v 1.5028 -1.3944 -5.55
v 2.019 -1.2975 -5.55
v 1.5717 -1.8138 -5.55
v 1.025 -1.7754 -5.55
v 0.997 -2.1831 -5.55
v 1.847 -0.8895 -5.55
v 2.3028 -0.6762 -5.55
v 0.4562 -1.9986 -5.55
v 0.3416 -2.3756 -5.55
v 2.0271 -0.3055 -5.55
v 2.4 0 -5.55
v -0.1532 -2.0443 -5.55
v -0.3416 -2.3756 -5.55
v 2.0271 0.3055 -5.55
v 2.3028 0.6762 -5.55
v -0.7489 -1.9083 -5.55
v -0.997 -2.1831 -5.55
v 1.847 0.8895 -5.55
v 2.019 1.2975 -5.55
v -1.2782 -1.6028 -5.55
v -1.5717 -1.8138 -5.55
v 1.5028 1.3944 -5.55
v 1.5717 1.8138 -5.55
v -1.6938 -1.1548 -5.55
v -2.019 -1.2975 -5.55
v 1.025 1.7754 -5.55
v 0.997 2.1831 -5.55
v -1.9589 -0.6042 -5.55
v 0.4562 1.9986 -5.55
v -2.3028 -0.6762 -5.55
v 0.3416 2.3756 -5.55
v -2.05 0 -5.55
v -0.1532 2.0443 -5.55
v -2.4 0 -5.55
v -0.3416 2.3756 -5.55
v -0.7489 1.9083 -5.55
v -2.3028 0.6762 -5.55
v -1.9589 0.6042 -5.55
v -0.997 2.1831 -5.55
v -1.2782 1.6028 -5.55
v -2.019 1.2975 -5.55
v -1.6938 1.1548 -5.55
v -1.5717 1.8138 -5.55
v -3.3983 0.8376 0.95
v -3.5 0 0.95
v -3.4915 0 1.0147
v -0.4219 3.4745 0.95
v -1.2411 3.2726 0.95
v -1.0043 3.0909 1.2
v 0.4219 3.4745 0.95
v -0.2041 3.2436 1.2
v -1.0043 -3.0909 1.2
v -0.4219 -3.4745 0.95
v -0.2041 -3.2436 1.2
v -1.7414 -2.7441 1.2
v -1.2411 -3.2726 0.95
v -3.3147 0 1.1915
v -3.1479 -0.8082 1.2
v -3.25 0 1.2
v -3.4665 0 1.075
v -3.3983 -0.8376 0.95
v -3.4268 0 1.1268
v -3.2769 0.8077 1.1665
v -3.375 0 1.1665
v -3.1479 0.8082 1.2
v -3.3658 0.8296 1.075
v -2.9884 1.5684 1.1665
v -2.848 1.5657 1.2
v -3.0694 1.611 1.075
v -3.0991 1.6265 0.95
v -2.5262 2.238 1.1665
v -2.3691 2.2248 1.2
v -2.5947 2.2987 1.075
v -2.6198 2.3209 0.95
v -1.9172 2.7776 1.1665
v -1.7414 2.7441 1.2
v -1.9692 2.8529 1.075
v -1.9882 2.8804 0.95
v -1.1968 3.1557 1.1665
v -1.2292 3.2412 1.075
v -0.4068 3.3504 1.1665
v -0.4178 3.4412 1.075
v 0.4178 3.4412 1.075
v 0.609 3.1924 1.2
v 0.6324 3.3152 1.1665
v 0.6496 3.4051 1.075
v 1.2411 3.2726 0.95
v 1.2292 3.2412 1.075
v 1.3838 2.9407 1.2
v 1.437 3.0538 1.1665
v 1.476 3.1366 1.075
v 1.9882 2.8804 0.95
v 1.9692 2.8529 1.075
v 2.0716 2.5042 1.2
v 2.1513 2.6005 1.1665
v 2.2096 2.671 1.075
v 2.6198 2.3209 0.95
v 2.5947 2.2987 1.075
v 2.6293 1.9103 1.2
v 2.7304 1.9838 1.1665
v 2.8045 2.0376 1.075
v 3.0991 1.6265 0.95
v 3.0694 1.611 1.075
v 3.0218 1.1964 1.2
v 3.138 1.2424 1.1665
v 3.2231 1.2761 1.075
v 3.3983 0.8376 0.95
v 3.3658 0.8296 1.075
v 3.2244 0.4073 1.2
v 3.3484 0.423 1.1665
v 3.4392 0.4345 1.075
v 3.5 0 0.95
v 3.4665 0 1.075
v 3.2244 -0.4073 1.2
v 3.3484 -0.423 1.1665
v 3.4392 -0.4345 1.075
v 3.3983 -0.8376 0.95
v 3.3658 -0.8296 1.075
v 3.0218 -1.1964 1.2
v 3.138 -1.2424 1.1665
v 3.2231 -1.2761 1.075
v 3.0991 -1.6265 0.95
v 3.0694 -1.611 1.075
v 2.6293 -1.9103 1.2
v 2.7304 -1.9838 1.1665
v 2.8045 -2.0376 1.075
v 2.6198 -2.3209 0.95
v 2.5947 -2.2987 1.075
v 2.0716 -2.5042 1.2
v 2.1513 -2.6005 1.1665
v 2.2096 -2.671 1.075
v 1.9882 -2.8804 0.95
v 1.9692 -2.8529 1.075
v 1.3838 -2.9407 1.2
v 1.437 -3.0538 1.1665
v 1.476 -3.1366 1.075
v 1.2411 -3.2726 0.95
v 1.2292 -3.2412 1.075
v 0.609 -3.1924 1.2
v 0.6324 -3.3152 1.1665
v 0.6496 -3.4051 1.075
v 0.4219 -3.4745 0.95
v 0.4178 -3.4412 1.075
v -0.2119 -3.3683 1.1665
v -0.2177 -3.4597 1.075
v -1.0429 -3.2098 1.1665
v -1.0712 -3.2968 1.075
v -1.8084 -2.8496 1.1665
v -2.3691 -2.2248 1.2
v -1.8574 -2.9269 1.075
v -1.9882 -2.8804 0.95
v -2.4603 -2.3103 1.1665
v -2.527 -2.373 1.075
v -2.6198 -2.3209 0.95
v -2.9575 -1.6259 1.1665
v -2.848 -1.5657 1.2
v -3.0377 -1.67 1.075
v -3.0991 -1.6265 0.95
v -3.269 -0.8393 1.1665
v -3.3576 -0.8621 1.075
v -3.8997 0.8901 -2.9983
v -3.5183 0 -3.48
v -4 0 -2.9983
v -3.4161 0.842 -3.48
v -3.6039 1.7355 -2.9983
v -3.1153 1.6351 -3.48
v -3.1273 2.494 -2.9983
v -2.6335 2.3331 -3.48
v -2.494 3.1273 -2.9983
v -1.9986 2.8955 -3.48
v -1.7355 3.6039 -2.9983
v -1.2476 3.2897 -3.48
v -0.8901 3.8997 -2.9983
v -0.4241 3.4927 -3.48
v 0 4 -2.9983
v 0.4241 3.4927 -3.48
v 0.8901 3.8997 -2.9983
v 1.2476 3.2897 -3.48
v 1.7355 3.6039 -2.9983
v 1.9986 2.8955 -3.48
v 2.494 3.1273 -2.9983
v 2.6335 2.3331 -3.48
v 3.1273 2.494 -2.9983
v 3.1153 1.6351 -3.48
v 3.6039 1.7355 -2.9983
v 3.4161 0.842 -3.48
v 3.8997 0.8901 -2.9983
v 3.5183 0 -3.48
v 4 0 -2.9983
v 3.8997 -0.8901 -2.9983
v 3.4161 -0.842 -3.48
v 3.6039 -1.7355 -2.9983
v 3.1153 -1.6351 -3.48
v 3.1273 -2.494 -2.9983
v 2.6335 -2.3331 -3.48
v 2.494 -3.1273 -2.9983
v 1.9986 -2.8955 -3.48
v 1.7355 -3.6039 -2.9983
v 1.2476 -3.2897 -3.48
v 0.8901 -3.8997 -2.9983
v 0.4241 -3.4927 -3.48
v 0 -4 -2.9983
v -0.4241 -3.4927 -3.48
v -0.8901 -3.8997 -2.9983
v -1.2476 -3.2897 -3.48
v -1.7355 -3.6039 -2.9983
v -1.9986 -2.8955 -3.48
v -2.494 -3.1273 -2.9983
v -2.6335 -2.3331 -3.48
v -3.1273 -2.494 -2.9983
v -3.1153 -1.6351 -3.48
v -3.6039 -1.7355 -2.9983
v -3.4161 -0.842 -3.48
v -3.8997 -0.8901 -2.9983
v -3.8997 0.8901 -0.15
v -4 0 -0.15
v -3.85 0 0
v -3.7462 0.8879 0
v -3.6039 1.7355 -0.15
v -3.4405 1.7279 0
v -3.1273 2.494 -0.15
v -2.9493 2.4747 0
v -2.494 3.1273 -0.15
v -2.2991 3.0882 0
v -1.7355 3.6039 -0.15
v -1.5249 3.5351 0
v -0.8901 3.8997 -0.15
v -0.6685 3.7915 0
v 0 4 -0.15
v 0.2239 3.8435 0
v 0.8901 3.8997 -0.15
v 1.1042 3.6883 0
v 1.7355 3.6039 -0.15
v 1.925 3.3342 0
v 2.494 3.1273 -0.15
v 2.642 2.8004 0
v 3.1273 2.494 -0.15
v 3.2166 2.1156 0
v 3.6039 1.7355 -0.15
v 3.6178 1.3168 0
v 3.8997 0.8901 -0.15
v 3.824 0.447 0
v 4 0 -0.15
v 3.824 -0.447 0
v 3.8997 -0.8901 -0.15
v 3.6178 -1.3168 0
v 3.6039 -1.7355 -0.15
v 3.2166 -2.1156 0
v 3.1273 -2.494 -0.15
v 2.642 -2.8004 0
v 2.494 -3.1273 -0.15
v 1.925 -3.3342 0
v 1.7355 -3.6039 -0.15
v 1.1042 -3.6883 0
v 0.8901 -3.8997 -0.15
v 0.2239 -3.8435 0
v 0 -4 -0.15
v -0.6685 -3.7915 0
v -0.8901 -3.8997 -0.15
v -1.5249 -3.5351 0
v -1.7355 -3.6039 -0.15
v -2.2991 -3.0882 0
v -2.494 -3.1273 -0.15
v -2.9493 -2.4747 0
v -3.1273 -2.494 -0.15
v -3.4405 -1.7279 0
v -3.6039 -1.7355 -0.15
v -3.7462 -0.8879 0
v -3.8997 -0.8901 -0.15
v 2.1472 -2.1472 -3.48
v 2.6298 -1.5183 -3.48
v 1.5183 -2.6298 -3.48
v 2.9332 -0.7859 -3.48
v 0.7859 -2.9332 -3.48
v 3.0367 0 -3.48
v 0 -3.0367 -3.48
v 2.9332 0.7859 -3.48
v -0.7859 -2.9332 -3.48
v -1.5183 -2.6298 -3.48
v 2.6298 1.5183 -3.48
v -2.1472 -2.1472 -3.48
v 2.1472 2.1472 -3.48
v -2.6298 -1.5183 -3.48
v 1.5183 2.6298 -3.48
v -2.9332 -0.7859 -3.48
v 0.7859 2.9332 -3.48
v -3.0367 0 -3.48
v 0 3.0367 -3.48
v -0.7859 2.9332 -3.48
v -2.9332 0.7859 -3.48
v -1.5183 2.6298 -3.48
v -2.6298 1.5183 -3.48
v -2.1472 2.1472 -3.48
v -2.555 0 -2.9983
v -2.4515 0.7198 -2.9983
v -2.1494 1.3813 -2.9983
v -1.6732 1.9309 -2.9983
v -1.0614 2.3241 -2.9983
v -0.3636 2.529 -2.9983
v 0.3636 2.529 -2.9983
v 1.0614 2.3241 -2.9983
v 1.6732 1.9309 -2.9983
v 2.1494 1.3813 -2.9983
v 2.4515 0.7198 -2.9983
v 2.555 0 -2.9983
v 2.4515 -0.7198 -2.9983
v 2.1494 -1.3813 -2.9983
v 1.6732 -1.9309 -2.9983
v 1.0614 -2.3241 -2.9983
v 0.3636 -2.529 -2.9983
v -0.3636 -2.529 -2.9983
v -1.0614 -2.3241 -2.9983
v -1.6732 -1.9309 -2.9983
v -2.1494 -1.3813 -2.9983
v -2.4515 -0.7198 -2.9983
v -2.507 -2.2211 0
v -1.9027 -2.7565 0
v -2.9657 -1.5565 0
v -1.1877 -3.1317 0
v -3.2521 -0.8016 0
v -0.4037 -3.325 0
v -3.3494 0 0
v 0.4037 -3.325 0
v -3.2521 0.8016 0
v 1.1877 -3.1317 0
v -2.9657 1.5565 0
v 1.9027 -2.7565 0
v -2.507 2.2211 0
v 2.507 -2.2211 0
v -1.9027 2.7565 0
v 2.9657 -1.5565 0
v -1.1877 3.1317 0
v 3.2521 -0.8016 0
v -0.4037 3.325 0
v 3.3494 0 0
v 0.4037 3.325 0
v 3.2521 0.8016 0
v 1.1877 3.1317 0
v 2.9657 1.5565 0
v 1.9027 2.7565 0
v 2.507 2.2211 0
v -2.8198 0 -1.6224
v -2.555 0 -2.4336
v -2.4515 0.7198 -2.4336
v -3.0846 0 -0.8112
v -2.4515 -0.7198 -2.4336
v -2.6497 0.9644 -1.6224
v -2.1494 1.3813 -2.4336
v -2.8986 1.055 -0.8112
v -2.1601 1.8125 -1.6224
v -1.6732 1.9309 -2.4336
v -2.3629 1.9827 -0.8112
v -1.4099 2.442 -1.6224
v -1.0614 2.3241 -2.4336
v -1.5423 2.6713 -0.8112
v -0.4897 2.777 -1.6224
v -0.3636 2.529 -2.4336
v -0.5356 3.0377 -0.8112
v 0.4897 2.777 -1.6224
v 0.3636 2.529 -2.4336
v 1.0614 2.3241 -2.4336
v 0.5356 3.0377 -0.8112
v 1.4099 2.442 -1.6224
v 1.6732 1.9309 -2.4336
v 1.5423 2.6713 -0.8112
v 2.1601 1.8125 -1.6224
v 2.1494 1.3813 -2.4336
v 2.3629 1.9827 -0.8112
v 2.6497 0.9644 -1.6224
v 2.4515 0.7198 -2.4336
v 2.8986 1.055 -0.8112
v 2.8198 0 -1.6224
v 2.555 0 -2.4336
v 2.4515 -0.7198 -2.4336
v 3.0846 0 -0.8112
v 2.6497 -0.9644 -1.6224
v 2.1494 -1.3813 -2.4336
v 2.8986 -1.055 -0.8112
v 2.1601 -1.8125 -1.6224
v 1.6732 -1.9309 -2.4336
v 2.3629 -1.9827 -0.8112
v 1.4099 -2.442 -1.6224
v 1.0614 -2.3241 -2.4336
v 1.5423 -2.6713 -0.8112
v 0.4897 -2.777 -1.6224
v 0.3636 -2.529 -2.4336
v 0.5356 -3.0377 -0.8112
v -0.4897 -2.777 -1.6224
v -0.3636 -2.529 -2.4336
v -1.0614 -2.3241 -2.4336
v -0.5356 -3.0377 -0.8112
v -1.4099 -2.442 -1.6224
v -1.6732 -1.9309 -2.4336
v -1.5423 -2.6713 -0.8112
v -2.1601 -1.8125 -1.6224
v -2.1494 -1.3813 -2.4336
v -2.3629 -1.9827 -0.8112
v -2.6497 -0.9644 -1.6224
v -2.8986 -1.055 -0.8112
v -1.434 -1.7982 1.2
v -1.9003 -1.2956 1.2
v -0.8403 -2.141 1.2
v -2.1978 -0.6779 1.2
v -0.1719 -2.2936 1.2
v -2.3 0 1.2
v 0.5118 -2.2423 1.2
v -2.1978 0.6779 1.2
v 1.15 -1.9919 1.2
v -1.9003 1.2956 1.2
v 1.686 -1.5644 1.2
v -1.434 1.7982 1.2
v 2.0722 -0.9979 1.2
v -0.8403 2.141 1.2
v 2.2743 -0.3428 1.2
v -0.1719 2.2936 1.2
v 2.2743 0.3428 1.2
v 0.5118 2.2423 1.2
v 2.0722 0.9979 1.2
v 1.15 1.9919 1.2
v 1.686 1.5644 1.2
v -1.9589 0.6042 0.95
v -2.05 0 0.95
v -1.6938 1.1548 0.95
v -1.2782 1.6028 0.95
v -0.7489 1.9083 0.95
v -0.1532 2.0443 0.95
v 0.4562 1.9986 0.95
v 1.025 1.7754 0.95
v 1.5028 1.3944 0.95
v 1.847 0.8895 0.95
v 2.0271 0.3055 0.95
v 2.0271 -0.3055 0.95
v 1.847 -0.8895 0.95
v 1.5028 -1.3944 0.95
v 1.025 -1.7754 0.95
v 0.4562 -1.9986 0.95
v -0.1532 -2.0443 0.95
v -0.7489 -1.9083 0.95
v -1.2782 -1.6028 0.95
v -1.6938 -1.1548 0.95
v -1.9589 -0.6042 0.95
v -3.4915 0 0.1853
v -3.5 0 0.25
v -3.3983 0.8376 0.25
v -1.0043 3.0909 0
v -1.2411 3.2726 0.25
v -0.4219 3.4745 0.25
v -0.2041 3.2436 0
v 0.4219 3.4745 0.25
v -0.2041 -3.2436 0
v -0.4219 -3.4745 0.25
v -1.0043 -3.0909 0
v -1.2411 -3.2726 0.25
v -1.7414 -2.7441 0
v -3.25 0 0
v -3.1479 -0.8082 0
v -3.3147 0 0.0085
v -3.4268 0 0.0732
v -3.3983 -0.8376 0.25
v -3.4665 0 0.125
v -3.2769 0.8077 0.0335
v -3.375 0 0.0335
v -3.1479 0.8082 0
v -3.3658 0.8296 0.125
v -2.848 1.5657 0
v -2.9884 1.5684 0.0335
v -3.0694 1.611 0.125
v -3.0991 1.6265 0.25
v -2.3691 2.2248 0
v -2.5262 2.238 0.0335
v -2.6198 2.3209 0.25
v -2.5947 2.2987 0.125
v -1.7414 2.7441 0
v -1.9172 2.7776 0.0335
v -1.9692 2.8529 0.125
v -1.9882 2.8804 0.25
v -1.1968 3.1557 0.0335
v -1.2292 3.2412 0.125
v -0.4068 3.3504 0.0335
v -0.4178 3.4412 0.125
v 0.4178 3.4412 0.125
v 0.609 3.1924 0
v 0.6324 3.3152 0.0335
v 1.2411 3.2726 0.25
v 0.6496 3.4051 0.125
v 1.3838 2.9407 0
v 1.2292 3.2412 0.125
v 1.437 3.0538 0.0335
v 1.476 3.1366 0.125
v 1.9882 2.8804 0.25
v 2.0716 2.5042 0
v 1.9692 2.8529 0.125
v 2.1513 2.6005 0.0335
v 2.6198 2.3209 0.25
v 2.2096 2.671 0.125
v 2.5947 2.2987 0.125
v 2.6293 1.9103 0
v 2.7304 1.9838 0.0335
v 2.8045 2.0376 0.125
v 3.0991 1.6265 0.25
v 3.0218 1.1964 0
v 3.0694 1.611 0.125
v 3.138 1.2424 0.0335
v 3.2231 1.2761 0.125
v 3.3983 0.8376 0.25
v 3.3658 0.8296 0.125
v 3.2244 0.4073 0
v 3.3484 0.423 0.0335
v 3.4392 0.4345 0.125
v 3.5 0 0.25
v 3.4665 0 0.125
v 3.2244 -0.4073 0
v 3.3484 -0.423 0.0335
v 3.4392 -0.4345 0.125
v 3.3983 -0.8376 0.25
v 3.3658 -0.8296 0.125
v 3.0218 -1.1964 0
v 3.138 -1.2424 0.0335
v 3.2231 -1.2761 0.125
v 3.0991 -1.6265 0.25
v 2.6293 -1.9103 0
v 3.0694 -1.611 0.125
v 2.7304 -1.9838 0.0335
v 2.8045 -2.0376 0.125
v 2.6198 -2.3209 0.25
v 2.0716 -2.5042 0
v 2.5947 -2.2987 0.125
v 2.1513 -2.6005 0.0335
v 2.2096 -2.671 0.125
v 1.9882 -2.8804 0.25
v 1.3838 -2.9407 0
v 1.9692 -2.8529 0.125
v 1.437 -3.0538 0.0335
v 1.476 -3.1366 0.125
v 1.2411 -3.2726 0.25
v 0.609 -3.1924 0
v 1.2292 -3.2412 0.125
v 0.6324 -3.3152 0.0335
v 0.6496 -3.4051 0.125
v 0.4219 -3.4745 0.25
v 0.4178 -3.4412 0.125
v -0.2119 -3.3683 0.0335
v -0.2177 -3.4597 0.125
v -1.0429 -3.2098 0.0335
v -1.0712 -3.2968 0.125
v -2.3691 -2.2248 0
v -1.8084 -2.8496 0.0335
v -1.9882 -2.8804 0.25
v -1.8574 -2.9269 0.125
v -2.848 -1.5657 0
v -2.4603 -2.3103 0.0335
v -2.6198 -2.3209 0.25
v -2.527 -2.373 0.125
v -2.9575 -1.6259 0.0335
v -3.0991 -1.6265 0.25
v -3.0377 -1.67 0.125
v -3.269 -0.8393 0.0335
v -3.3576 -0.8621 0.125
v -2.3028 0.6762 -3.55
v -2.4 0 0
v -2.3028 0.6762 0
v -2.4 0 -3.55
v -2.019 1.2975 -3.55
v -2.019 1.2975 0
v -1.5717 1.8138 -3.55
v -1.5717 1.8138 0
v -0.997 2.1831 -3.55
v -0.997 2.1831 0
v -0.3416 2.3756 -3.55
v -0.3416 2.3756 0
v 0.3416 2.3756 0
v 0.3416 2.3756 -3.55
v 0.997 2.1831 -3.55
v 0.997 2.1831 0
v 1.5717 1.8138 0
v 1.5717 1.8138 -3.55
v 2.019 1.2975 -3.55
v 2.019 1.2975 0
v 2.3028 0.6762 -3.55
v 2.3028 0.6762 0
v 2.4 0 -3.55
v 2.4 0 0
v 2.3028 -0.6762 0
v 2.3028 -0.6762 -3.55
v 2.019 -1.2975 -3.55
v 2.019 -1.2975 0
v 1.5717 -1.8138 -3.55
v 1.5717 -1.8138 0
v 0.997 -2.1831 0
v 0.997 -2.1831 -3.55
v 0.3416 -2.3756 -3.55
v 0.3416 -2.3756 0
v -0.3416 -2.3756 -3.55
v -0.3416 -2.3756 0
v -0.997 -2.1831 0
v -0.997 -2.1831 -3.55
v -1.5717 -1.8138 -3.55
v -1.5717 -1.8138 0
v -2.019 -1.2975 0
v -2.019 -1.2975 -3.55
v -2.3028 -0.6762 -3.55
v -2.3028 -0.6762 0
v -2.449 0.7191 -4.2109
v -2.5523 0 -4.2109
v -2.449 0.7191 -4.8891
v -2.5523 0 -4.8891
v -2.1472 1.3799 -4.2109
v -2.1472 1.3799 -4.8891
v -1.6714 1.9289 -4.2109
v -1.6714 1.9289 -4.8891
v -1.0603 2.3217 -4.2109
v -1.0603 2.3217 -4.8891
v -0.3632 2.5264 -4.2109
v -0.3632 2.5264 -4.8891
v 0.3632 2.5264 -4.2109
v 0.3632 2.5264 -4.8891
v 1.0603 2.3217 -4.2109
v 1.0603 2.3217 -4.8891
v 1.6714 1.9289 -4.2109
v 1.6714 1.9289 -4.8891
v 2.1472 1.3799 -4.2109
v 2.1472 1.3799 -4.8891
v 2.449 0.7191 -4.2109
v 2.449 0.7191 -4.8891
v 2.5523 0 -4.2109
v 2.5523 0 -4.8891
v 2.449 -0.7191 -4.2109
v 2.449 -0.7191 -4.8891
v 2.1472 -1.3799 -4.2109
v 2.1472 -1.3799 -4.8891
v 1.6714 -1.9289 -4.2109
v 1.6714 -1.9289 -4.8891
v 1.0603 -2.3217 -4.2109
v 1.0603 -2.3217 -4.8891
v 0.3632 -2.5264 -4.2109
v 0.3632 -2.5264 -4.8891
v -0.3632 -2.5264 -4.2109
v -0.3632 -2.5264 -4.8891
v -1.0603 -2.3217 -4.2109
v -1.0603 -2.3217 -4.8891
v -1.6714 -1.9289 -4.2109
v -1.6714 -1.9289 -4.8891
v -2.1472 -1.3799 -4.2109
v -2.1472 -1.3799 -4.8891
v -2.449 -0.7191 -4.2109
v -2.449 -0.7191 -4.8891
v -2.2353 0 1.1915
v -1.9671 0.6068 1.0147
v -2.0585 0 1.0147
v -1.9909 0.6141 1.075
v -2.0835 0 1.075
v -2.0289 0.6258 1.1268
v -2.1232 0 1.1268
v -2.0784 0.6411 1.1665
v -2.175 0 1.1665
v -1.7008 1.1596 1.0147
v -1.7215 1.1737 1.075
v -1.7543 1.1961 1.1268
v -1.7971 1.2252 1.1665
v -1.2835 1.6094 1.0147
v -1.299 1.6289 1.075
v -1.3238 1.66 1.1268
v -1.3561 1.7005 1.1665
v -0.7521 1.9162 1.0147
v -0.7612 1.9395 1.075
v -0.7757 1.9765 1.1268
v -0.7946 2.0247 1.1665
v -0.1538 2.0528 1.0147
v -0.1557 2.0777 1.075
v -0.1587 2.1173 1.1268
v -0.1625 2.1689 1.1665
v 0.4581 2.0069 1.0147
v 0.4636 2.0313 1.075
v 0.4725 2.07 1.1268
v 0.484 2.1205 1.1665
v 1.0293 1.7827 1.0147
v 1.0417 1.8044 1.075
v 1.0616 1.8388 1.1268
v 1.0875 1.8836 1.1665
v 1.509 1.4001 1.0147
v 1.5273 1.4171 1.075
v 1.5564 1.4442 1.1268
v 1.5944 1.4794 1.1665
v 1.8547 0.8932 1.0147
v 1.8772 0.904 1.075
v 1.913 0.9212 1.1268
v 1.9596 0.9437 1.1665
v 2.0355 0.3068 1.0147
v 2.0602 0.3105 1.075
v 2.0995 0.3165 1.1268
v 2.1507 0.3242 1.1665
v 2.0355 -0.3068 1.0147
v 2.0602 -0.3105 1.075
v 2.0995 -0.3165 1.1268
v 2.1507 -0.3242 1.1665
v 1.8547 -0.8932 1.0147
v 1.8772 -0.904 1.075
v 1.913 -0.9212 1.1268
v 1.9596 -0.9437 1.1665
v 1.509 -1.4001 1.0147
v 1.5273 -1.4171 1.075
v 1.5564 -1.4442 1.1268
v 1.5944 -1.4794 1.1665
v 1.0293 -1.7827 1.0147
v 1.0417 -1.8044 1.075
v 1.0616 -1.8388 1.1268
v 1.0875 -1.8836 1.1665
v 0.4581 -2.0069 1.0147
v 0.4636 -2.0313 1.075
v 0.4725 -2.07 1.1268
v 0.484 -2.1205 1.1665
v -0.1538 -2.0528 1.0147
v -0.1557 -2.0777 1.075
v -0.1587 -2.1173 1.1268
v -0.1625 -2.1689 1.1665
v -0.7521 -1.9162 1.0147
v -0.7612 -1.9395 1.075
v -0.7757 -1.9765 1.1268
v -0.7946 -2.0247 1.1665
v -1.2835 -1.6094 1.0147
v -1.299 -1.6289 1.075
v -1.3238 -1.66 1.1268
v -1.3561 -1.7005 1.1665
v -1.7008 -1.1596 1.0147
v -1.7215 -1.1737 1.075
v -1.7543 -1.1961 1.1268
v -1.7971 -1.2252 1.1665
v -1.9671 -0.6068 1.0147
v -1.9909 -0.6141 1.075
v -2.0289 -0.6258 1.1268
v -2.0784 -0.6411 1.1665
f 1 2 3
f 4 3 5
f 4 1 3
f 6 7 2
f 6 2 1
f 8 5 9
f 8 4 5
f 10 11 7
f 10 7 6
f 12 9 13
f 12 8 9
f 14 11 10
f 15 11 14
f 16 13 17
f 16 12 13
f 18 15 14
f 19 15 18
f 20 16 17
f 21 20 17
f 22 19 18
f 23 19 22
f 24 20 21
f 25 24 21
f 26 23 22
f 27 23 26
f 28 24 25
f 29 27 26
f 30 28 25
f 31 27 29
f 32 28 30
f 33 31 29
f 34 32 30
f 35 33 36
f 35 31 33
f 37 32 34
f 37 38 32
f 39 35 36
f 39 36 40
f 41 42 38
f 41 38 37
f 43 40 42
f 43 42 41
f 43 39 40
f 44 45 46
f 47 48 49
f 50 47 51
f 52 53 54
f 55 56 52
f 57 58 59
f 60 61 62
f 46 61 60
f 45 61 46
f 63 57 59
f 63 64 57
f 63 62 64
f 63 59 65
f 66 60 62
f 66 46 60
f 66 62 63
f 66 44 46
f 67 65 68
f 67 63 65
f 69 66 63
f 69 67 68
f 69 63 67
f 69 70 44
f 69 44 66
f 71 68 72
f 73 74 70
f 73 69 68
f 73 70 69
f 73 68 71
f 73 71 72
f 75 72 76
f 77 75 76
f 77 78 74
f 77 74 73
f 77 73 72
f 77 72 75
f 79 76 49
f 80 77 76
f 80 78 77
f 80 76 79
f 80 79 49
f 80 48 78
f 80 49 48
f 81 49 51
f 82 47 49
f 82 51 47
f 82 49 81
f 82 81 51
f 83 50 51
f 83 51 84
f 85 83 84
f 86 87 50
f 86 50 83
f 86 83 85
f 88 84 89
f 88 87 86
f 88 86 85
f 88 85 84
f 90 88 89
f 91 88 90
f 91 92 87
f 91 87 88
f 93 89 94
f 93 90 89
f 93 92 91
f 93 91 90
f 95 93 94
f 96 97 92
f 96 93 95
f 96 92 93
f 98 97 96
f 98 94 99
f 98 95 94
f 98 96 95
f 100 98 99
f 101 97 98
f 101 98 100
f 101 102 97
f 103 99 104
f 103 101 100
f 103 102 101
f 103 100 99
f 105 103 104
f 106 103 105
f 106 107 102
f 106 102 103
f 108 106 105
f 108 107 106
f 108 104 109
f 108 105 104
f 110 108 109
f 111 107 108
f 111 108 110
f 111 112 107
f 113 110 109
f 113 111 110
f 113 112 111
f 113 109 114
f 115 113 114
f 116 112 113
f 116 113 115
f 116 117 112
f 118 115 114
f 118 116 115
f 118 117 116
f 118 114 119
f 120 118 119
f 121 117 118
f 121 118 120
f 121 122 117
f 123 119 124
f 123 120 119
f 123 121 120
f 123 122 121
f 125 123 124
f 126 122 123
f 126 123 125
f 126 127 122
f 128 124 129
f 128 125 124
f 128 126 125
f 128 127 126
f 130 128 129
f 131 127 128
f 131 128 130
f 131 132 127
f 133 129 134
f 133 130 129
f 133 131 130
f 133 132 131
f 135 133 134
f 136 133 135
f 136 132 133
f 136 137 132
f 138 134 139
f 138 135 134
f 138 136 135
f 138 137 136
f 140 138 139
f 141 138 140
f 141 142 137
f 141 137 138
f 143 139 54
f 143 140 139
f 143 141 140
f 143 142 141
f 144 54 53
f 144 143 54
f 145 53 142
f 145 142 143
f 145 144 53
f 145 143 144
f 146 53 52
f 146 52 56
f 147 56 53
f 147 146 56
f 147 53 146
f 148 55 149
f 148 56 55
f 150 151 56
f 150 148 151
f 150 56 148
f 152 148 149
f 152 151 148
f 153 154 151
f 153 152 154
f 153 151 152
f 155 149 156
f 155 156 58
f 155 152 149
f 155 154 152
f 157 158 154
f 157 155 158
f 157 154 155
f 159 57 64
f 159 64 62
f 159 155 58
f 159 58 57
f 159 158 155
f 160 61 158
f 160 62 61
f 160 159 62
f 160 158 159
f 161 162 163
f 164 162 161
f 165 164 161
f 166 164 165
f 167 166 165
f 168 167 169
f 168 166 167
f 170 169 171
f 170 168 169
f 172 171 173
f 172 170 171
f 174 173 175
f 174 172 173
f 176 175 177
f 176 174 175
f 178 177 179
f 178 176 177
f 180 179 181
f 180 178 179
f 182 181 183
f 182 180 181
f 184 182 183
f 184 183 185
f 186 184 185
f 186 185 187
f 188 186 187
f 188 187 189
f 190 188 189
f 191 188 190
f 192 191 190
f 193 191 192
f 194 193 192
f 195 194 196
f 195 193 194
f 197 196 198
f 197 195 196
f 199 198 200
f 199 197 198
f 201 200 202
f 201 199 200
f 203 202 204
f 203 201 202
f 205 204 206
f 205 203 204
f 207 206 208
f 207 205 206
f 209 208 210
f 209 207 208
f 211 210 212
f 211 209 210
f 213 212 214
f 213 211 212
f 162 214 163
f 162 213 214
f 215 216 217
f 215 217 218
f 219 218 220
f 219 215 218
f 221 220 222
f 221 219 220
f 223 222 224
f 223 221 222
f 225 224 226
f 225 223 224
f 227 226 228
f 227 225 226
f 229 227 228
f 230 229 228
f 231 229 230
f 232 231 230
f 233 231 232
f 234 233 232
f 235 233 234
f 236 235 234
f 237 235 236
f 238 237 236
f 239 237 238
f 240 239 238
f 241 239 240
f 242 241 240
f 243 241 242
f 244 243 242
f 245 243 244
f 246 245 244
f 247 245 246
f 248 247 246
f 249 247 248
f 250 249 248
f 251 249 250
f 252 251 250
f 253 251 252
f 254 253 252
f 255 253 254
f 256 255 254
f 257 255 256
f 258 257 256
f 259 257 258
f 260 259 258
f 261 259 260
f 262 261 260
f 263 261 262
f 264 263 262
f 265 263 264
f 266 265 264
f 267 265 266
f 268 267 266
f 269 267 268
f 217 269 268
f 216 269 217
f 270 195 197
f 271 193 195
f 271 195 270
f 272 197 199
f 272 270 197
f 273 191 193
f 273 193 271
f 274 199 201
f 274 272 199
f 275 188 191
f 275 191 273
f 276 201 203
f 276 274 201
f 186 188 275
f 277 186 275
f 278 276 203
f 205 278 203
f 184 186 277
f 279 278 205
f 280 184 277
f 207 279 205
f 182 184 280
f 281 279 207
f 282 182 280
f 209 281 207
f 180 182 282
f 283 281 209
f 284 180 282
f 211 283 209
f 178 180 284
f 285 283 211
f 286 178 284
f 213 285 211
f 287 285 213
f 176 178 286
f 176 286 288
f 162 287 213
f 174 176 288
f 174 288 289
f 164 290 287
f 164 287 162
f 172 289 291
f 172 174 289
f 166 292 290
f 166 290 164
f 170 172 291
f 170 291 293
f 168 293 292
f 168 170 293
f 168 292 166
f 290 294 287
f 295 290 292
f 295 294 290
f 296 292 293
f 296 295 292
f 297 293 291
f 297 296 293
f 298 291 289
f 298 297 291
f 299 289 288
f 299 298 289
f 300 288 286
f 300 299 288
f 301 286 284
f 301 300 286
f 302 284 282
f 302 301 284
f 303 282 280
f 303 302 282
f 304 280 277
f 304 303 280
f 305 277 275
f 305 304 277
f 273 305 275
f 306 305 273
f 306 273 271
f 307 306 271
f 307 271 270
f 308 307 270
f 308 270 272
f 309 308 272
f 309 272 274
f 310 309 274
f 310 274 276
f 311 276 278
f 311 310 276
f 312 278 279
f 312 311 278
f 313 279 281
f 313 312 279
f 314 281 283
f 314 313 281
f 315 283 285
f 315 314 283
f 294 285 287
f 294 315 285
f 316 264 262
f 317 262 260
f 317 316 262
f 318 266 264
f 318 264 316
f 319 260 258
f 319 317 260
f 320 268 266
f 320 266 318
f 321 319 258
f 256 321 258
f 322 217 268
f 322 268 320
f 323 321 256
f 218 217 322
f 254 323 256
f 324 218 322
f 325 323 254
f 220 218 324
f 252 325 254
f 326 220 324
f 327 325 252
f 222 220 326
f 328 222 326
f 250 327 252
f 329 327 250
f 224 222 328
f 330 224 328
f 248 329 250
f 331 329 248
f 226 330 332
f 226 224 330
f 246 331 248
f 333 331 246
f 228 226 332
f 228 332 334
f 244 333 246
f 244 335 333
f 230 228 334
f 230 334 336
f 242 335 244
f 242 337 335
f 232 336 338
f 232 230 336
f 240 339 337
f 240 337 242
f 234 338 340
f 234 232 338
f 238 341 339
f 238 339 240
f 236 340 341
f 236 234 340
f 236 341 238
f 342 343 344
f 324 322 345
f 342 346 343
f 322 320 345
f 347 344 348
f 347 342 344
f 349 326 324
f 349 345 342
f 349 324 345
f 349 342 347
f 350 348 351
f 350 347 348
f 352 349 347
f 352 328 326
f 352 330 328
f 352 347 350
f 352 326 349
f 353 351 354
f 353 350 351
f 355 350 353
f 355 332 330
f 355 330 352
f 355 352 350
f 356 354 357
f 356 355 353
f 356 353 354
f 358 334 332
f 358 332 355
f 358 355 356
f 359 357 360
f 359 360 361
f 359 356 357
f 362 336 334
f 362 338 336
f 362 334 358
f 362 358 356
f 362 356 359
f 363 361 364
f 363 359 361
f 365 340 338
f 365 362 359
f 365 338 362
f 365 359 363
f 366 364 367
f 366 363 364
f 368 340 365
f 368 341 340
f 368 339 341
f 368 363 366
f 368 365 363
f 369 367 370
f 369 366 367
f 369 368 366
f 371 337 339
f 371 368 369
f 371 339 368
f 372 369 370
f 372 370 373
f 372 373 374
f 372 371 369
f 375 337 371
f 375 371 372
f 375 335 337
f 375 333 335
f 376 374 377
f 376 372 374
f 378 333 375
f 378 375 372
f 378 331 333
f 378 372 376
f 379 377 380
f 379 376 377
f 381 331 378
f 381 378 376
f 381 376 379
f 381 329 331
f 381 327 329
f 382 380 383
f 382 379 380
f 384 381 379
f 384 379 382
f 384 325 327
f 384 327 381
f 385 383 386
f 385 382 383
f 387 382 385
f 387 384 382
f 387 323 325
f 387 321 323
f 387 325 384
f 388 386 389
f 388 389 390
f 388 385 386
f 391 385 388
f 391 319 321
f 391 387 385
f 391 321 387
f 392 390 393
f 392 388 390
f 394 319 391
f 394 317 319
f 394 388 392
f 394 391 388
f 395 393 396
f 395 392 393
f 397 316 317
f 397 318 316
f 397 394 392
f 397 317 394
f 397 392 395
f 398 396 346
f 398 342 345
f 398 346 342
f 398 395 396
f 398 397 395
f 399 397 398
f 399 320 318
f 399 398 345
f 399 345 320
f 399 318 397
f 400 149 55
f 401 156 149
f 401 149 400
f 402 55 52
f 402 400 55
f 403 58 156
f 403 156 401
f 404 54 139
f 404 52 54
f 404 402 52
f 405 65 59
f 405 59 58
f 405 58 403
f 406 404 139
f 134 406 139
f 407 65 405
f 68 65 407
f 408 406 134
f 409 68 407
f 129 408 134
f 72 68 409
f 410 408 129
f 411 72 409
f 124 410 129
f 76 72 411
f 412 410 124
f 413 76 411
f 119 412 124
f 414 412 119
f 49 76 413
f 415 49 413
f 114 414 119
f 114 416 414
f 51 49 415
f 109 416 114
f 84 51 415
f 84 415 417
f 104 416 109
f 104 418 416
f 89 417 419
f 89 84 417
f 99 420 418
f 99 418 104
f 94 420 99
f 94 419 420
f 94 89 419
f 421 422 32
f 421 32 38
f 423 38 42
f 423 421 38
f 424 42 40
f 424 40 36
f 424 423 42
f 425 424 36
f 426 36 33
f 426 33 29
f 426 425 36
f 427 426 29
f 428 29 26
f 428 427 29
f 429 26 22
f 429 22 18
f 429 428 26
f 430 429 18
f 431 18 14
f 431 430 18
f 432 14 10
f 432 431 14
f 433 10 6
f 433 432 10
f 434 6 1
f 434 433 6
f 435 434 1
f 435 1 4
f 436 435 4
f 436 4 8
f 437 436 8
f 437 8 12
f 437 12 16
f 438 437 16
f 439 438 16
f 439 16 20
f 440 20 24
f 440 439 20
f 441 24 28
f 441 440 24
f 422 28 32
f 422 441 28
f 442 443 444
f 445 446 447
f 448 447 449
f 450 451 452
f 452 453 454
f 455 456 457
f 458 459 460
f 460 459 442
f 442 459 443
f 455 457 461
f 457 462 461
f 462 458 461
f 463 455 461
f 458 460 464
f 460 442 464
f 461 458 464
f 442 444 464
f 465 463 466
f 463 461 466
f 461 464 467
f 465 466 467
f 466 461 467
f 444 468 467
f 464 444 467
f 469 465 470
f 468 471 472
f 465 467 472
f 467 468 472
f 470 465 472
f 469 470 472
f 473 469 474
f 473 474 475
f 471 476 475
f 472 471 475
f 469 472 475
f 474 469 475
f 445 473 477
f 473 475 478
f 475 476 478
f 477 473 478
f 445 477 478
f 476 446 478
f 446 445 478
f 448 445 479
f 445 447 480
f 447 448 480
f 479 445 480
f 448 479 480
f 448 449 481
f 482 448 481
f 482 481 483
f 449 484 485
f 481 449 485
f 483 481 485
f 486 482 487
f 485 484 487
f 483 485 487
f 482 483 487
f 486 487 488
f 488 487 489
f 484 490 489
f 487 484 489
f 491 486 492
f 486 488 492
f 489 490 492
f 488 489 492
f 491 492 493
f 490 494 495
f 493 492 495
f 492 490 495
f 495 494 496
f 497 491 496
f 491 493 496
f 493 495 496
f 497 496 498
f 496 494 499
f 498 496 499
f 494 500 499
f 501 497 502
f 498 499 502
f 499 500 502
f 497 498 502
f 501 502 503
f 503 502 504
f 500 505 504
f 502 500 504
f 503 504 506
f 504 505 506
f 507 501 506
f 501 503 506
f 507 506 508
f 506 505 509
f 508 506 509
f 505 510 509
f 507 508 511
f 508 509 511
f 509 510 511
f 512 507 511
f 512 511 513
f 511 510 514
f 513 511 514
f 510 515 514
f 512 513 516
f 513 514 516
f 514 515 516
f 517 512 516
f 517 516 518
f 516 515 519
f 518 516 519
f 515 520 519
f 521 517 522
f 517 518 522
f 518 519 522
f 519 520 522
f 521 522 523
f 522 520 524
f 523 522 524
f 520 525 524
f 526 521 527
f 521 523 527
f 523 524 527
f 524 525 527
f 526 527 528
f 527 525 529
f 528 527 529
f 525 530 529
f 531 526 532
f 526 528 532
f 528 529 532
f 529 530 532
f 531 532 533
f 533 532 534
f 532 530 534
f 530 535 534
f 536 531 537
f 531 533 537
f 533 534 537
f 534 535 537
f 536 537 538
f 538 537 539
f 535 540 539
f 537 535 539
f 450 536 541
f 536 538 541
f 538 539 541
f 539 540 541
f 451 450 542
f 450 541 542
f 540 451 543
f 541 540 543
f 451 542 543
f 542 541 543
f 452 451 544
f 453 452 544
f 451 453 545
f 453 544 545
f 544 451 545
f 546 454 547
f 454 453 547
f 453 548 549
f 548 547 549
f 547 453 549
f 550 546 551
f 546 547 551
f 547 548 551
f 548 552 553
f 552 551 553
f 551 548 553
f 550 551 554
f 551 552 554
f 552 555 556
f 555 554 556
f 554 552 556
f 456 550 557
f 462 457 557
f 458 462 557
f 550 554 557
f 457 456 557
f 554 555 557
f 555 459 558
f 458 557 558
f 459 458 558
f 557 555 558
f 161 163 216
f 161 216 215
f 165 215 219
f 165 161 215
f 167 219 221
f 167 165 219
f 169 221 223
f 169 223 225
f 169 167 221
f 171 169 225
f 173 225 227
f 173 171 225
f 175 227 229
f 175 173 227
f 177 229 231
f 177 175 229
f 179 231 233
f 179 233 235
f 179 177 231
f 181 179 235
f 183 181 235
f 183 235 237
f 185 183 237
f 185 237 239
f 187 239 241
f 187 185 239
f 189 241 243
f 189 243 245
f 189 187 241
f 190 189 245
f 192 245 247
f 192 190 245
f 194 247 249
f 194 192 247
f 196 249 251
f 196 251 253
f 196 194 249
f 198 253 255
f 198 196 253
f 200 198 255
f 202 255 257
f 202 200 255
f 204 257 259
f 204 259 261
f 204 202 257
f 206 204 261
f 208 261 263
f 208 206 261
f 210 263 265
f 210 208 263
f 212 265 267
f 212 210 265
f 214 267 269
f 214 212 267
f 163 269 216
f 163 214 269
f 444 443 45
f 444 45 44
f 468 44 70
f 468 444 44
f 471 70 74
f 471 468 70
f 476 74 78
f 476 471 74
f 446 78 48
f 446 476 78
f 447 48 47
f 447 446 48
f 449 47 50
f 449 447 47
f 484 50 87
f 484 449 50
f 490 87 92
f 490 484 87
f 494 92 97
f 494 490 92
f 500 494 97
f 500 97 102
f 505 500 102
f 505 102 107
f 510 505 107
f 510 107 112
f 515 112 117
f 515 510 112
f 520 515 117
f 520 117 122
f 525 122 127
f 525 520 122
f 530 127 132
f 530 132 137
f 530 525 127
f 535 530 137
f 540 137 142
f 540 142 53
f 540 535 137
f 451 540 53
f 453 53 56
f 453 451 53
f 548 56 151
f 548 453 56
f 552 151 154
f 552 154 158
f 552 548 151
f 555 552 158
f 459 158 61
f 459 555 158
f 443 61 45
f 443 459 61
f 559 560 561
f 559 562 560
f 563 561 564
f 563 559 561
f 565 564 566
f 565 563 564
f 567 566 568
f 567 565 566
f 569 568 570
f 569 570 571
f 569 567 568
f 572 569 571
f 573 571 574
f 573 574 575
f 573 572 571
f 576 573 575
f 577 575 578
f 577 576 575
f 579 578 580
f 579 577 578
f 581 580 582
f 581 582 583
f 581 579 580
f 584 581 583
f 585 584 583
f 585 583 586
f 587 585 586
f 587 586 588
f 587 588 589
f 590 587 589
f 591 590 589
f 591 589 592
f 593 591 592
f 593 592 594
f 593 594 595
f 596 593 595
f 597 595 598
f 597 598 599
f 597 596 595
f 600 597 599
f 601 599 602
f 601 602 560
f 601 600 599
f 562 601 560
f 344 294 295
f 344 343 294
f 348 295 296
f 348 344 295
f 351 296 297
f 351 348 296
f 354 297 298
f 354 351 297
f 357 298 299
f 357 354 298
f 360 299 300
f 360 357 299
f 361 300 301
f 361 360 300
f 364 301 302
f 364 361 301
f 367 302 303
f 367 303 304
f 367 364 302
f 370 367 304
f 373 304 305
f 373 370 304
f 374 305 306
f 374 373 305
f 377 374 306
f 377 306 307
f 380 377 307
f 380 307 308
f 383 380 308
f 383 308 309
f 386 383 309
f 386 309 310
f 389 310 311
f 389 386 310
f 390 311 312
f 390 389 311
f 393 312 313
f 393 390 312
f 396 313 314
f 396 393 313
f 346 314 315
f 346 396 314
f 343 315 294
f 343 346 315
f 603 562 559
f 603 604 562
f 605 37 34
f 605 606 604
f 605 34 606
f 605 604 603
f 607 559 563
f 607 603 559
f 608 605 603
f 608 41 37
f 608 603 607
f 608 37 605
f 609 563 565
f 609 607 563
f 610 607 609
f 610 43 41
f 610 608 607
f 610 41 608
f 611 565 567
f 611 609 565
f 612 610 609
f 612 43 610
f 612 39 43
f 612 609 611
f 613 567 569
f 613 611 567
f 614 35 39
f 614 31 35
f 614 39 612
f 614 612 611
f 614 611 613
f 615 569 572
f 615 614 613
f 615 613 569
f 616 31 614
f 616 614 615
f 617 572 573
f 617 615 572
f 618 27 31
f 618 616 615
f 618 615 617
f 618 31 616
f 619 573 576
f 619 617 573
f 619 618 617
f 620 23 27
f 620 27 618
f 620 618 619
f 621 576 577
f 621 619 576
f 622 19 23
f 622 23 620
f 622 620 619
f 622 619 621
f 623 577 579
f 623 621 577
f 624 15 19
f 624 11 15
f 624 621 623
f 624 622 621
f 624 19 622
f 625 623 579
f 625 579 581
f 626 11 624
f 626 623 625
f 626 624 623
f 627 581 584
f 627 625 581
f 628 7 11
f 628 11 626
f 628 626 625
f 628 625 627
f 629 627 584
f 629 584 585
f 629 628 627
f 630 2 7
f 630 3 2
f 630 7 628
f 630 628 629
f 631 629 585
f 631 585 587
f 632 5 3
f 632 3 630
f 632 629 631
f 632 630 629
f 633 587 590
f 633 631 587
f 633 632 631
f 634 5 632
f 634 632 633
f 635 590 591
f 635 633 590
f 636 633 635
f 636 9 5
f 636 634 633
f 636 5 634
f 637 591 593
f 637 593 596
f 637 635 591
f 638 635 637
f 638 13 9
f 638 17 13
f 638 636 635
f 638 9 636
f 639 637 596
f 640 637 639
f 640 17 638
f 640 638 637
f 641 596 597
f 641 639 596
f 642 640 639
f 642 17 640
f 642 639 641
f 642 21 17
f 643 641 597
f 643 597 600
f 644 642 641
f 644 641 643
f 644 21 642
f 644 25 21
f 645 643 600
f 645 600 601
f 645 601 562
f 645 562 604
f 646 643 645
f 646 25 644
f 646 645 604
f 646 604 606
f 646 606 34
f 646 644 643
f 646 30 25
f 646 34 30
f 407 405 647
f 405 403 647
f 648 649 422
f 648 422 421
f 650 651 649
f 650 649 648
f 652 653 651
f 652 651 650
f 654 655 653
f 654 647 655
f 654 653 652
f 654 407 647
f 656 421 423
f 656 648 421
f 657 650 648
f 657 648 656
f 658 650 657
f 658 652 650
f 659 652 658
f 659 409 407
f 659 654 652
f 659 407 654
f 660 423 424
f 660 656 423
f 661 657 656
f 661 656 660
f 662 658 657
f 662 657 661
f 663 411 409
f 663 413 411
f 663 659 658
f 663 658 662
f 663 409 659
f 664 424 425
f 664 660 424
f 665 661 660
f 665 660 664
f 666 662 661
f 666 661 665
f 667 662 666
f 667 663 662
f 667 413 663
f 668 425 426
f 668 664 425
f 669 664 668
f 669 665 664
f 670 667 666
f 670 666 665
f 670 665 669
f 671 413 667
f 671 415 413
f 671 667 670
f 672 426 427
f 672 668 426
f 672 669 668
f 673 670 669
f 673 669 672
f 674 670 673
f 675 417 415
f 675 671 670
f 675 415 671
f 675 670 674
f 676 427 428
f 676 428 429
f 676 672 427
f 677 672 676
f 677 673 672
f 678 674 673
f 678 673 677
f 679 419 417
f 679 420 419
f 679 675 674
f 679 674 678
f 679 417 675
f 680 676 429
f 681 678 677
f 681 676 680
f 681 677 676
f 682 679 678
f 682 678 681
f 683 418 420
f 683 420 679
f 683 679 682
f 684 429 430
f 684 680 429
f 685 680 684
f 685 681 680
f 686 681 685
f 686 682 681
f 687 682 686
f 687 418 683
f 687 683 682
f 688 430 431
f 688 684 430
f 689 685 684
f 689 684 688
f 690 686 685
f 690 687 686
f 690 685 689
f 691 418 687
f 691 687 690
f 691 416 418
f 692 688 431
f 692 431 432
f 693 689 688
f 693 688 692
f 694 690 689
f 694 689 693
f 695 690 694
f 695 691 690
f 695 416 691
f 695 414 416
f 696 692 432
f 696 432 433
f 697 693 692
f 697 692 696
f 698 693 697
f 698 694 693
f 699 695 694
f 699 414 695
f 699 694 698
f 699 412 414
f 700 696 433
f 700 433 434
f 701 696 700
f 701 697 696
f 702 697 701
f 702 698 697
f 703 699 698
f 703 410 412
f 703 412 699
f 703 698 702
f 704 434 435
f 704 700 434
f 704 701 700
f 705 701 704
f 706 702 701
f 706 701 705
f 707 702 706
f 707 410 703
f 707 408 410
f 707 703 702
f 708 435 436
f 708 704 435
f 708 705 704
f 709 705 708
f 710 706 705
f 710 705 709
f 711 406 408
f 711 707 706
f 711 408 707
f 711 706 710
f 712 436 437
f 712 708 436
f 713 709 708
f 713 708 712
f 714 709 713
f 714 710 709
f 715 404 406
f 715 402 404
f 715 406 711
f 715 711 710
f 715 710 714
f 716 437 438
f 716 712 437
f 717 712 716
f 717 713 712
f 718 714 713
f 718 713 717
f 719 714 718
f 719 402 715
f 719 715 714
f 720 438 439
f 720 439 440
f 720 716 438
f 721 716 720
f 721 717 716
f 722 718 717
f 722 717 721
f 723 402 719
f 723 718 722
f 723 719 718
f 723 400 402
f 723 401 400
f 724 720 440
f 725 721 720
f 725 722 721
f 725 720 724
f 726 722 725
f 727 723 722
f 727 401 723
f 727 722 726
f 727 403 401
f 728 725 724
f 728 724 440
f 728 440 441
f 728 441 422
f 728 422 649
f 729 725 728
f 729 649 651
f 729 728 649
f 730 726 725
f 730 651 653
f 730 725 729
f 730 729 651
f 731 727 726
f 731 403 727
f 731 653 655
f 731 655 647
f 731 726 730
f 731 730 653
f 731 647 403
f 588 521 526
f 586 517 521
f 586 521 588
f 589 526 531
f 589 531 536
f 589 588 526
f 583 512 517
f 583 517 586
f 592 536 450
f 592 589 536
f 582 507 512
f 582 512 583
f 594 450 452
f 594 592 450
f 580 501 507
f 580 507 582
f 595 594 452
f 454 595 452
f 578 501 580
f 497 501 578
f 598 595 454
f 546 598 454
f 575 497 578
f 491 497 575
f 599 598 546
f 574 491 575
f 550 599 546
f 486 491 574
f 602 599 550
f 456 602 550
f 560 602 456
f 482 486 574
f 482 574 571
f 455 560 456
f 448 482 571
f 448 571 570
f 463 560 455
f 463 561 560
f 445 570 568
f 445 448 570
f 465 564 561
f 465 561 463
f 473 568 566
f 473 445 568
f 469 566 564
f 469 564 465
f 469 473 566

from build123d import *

# Parameters (mm, degrees)
F2_SIZE = 0.15
F5_R    = 0.25


with BuildPart() as f1:
    # F0 (on Front) → F1 (revolve)
    with BuildSketch(Plane.XZ):
        Polygon((-2.555, -2.433606), (-3.349384, 0), (-4, 0), (-4, -2.998333), (-3.518333, -3.48), (-3.036667, -3.48), (-2.555, -2.998333), align=None)
    revolve(axis=Axis((0, 0, -2.45793), (0, 0, -1)))

    # F2
    f2_edges = [f1.edges().sort_by_distance(p)[0] for p in [
        (4, 0, 0),
    ]]
    chamfer(f2_edges, length=F2_SIZE)


with BuildPart() as f4:
    # F3 (on Front) → F4 (revolve)
    with BuildSketch(Plane.XZ):
        with BuildLine():
            Line((-3.5, 0), (-2.4, 0))
            Line((-2.4, 0), (-2.4, -3.55))
            ThreePointArc((-2.4, -3.55), (-2.571573, -4.55), (-2.4, -5.55))
            Line((-2.4, -5.55), (-2.05, -5.55))
            Line((-2.05, -5.55), (-2.05, 1.2))
            Line((-2.05, 1.2), (-3.5, 1.2))
            Line((-3.5, 1.2), (-3.5, 0))
        make_face()
    revolve(axis=Axis((0, 0, -3.051124), (0, 0, -1)))

    # F5
    f5_edges = [f4.edges().sort_by_distance(p)[0] for p in [
        (3.5, 0, 1.2),
        (3.5, 0, 0),
        (2.05, 0, 1.2),
    ]]
    fillet(f5_edges, radius=F5_R)


solid = Compound([f1.part, f4.part])
